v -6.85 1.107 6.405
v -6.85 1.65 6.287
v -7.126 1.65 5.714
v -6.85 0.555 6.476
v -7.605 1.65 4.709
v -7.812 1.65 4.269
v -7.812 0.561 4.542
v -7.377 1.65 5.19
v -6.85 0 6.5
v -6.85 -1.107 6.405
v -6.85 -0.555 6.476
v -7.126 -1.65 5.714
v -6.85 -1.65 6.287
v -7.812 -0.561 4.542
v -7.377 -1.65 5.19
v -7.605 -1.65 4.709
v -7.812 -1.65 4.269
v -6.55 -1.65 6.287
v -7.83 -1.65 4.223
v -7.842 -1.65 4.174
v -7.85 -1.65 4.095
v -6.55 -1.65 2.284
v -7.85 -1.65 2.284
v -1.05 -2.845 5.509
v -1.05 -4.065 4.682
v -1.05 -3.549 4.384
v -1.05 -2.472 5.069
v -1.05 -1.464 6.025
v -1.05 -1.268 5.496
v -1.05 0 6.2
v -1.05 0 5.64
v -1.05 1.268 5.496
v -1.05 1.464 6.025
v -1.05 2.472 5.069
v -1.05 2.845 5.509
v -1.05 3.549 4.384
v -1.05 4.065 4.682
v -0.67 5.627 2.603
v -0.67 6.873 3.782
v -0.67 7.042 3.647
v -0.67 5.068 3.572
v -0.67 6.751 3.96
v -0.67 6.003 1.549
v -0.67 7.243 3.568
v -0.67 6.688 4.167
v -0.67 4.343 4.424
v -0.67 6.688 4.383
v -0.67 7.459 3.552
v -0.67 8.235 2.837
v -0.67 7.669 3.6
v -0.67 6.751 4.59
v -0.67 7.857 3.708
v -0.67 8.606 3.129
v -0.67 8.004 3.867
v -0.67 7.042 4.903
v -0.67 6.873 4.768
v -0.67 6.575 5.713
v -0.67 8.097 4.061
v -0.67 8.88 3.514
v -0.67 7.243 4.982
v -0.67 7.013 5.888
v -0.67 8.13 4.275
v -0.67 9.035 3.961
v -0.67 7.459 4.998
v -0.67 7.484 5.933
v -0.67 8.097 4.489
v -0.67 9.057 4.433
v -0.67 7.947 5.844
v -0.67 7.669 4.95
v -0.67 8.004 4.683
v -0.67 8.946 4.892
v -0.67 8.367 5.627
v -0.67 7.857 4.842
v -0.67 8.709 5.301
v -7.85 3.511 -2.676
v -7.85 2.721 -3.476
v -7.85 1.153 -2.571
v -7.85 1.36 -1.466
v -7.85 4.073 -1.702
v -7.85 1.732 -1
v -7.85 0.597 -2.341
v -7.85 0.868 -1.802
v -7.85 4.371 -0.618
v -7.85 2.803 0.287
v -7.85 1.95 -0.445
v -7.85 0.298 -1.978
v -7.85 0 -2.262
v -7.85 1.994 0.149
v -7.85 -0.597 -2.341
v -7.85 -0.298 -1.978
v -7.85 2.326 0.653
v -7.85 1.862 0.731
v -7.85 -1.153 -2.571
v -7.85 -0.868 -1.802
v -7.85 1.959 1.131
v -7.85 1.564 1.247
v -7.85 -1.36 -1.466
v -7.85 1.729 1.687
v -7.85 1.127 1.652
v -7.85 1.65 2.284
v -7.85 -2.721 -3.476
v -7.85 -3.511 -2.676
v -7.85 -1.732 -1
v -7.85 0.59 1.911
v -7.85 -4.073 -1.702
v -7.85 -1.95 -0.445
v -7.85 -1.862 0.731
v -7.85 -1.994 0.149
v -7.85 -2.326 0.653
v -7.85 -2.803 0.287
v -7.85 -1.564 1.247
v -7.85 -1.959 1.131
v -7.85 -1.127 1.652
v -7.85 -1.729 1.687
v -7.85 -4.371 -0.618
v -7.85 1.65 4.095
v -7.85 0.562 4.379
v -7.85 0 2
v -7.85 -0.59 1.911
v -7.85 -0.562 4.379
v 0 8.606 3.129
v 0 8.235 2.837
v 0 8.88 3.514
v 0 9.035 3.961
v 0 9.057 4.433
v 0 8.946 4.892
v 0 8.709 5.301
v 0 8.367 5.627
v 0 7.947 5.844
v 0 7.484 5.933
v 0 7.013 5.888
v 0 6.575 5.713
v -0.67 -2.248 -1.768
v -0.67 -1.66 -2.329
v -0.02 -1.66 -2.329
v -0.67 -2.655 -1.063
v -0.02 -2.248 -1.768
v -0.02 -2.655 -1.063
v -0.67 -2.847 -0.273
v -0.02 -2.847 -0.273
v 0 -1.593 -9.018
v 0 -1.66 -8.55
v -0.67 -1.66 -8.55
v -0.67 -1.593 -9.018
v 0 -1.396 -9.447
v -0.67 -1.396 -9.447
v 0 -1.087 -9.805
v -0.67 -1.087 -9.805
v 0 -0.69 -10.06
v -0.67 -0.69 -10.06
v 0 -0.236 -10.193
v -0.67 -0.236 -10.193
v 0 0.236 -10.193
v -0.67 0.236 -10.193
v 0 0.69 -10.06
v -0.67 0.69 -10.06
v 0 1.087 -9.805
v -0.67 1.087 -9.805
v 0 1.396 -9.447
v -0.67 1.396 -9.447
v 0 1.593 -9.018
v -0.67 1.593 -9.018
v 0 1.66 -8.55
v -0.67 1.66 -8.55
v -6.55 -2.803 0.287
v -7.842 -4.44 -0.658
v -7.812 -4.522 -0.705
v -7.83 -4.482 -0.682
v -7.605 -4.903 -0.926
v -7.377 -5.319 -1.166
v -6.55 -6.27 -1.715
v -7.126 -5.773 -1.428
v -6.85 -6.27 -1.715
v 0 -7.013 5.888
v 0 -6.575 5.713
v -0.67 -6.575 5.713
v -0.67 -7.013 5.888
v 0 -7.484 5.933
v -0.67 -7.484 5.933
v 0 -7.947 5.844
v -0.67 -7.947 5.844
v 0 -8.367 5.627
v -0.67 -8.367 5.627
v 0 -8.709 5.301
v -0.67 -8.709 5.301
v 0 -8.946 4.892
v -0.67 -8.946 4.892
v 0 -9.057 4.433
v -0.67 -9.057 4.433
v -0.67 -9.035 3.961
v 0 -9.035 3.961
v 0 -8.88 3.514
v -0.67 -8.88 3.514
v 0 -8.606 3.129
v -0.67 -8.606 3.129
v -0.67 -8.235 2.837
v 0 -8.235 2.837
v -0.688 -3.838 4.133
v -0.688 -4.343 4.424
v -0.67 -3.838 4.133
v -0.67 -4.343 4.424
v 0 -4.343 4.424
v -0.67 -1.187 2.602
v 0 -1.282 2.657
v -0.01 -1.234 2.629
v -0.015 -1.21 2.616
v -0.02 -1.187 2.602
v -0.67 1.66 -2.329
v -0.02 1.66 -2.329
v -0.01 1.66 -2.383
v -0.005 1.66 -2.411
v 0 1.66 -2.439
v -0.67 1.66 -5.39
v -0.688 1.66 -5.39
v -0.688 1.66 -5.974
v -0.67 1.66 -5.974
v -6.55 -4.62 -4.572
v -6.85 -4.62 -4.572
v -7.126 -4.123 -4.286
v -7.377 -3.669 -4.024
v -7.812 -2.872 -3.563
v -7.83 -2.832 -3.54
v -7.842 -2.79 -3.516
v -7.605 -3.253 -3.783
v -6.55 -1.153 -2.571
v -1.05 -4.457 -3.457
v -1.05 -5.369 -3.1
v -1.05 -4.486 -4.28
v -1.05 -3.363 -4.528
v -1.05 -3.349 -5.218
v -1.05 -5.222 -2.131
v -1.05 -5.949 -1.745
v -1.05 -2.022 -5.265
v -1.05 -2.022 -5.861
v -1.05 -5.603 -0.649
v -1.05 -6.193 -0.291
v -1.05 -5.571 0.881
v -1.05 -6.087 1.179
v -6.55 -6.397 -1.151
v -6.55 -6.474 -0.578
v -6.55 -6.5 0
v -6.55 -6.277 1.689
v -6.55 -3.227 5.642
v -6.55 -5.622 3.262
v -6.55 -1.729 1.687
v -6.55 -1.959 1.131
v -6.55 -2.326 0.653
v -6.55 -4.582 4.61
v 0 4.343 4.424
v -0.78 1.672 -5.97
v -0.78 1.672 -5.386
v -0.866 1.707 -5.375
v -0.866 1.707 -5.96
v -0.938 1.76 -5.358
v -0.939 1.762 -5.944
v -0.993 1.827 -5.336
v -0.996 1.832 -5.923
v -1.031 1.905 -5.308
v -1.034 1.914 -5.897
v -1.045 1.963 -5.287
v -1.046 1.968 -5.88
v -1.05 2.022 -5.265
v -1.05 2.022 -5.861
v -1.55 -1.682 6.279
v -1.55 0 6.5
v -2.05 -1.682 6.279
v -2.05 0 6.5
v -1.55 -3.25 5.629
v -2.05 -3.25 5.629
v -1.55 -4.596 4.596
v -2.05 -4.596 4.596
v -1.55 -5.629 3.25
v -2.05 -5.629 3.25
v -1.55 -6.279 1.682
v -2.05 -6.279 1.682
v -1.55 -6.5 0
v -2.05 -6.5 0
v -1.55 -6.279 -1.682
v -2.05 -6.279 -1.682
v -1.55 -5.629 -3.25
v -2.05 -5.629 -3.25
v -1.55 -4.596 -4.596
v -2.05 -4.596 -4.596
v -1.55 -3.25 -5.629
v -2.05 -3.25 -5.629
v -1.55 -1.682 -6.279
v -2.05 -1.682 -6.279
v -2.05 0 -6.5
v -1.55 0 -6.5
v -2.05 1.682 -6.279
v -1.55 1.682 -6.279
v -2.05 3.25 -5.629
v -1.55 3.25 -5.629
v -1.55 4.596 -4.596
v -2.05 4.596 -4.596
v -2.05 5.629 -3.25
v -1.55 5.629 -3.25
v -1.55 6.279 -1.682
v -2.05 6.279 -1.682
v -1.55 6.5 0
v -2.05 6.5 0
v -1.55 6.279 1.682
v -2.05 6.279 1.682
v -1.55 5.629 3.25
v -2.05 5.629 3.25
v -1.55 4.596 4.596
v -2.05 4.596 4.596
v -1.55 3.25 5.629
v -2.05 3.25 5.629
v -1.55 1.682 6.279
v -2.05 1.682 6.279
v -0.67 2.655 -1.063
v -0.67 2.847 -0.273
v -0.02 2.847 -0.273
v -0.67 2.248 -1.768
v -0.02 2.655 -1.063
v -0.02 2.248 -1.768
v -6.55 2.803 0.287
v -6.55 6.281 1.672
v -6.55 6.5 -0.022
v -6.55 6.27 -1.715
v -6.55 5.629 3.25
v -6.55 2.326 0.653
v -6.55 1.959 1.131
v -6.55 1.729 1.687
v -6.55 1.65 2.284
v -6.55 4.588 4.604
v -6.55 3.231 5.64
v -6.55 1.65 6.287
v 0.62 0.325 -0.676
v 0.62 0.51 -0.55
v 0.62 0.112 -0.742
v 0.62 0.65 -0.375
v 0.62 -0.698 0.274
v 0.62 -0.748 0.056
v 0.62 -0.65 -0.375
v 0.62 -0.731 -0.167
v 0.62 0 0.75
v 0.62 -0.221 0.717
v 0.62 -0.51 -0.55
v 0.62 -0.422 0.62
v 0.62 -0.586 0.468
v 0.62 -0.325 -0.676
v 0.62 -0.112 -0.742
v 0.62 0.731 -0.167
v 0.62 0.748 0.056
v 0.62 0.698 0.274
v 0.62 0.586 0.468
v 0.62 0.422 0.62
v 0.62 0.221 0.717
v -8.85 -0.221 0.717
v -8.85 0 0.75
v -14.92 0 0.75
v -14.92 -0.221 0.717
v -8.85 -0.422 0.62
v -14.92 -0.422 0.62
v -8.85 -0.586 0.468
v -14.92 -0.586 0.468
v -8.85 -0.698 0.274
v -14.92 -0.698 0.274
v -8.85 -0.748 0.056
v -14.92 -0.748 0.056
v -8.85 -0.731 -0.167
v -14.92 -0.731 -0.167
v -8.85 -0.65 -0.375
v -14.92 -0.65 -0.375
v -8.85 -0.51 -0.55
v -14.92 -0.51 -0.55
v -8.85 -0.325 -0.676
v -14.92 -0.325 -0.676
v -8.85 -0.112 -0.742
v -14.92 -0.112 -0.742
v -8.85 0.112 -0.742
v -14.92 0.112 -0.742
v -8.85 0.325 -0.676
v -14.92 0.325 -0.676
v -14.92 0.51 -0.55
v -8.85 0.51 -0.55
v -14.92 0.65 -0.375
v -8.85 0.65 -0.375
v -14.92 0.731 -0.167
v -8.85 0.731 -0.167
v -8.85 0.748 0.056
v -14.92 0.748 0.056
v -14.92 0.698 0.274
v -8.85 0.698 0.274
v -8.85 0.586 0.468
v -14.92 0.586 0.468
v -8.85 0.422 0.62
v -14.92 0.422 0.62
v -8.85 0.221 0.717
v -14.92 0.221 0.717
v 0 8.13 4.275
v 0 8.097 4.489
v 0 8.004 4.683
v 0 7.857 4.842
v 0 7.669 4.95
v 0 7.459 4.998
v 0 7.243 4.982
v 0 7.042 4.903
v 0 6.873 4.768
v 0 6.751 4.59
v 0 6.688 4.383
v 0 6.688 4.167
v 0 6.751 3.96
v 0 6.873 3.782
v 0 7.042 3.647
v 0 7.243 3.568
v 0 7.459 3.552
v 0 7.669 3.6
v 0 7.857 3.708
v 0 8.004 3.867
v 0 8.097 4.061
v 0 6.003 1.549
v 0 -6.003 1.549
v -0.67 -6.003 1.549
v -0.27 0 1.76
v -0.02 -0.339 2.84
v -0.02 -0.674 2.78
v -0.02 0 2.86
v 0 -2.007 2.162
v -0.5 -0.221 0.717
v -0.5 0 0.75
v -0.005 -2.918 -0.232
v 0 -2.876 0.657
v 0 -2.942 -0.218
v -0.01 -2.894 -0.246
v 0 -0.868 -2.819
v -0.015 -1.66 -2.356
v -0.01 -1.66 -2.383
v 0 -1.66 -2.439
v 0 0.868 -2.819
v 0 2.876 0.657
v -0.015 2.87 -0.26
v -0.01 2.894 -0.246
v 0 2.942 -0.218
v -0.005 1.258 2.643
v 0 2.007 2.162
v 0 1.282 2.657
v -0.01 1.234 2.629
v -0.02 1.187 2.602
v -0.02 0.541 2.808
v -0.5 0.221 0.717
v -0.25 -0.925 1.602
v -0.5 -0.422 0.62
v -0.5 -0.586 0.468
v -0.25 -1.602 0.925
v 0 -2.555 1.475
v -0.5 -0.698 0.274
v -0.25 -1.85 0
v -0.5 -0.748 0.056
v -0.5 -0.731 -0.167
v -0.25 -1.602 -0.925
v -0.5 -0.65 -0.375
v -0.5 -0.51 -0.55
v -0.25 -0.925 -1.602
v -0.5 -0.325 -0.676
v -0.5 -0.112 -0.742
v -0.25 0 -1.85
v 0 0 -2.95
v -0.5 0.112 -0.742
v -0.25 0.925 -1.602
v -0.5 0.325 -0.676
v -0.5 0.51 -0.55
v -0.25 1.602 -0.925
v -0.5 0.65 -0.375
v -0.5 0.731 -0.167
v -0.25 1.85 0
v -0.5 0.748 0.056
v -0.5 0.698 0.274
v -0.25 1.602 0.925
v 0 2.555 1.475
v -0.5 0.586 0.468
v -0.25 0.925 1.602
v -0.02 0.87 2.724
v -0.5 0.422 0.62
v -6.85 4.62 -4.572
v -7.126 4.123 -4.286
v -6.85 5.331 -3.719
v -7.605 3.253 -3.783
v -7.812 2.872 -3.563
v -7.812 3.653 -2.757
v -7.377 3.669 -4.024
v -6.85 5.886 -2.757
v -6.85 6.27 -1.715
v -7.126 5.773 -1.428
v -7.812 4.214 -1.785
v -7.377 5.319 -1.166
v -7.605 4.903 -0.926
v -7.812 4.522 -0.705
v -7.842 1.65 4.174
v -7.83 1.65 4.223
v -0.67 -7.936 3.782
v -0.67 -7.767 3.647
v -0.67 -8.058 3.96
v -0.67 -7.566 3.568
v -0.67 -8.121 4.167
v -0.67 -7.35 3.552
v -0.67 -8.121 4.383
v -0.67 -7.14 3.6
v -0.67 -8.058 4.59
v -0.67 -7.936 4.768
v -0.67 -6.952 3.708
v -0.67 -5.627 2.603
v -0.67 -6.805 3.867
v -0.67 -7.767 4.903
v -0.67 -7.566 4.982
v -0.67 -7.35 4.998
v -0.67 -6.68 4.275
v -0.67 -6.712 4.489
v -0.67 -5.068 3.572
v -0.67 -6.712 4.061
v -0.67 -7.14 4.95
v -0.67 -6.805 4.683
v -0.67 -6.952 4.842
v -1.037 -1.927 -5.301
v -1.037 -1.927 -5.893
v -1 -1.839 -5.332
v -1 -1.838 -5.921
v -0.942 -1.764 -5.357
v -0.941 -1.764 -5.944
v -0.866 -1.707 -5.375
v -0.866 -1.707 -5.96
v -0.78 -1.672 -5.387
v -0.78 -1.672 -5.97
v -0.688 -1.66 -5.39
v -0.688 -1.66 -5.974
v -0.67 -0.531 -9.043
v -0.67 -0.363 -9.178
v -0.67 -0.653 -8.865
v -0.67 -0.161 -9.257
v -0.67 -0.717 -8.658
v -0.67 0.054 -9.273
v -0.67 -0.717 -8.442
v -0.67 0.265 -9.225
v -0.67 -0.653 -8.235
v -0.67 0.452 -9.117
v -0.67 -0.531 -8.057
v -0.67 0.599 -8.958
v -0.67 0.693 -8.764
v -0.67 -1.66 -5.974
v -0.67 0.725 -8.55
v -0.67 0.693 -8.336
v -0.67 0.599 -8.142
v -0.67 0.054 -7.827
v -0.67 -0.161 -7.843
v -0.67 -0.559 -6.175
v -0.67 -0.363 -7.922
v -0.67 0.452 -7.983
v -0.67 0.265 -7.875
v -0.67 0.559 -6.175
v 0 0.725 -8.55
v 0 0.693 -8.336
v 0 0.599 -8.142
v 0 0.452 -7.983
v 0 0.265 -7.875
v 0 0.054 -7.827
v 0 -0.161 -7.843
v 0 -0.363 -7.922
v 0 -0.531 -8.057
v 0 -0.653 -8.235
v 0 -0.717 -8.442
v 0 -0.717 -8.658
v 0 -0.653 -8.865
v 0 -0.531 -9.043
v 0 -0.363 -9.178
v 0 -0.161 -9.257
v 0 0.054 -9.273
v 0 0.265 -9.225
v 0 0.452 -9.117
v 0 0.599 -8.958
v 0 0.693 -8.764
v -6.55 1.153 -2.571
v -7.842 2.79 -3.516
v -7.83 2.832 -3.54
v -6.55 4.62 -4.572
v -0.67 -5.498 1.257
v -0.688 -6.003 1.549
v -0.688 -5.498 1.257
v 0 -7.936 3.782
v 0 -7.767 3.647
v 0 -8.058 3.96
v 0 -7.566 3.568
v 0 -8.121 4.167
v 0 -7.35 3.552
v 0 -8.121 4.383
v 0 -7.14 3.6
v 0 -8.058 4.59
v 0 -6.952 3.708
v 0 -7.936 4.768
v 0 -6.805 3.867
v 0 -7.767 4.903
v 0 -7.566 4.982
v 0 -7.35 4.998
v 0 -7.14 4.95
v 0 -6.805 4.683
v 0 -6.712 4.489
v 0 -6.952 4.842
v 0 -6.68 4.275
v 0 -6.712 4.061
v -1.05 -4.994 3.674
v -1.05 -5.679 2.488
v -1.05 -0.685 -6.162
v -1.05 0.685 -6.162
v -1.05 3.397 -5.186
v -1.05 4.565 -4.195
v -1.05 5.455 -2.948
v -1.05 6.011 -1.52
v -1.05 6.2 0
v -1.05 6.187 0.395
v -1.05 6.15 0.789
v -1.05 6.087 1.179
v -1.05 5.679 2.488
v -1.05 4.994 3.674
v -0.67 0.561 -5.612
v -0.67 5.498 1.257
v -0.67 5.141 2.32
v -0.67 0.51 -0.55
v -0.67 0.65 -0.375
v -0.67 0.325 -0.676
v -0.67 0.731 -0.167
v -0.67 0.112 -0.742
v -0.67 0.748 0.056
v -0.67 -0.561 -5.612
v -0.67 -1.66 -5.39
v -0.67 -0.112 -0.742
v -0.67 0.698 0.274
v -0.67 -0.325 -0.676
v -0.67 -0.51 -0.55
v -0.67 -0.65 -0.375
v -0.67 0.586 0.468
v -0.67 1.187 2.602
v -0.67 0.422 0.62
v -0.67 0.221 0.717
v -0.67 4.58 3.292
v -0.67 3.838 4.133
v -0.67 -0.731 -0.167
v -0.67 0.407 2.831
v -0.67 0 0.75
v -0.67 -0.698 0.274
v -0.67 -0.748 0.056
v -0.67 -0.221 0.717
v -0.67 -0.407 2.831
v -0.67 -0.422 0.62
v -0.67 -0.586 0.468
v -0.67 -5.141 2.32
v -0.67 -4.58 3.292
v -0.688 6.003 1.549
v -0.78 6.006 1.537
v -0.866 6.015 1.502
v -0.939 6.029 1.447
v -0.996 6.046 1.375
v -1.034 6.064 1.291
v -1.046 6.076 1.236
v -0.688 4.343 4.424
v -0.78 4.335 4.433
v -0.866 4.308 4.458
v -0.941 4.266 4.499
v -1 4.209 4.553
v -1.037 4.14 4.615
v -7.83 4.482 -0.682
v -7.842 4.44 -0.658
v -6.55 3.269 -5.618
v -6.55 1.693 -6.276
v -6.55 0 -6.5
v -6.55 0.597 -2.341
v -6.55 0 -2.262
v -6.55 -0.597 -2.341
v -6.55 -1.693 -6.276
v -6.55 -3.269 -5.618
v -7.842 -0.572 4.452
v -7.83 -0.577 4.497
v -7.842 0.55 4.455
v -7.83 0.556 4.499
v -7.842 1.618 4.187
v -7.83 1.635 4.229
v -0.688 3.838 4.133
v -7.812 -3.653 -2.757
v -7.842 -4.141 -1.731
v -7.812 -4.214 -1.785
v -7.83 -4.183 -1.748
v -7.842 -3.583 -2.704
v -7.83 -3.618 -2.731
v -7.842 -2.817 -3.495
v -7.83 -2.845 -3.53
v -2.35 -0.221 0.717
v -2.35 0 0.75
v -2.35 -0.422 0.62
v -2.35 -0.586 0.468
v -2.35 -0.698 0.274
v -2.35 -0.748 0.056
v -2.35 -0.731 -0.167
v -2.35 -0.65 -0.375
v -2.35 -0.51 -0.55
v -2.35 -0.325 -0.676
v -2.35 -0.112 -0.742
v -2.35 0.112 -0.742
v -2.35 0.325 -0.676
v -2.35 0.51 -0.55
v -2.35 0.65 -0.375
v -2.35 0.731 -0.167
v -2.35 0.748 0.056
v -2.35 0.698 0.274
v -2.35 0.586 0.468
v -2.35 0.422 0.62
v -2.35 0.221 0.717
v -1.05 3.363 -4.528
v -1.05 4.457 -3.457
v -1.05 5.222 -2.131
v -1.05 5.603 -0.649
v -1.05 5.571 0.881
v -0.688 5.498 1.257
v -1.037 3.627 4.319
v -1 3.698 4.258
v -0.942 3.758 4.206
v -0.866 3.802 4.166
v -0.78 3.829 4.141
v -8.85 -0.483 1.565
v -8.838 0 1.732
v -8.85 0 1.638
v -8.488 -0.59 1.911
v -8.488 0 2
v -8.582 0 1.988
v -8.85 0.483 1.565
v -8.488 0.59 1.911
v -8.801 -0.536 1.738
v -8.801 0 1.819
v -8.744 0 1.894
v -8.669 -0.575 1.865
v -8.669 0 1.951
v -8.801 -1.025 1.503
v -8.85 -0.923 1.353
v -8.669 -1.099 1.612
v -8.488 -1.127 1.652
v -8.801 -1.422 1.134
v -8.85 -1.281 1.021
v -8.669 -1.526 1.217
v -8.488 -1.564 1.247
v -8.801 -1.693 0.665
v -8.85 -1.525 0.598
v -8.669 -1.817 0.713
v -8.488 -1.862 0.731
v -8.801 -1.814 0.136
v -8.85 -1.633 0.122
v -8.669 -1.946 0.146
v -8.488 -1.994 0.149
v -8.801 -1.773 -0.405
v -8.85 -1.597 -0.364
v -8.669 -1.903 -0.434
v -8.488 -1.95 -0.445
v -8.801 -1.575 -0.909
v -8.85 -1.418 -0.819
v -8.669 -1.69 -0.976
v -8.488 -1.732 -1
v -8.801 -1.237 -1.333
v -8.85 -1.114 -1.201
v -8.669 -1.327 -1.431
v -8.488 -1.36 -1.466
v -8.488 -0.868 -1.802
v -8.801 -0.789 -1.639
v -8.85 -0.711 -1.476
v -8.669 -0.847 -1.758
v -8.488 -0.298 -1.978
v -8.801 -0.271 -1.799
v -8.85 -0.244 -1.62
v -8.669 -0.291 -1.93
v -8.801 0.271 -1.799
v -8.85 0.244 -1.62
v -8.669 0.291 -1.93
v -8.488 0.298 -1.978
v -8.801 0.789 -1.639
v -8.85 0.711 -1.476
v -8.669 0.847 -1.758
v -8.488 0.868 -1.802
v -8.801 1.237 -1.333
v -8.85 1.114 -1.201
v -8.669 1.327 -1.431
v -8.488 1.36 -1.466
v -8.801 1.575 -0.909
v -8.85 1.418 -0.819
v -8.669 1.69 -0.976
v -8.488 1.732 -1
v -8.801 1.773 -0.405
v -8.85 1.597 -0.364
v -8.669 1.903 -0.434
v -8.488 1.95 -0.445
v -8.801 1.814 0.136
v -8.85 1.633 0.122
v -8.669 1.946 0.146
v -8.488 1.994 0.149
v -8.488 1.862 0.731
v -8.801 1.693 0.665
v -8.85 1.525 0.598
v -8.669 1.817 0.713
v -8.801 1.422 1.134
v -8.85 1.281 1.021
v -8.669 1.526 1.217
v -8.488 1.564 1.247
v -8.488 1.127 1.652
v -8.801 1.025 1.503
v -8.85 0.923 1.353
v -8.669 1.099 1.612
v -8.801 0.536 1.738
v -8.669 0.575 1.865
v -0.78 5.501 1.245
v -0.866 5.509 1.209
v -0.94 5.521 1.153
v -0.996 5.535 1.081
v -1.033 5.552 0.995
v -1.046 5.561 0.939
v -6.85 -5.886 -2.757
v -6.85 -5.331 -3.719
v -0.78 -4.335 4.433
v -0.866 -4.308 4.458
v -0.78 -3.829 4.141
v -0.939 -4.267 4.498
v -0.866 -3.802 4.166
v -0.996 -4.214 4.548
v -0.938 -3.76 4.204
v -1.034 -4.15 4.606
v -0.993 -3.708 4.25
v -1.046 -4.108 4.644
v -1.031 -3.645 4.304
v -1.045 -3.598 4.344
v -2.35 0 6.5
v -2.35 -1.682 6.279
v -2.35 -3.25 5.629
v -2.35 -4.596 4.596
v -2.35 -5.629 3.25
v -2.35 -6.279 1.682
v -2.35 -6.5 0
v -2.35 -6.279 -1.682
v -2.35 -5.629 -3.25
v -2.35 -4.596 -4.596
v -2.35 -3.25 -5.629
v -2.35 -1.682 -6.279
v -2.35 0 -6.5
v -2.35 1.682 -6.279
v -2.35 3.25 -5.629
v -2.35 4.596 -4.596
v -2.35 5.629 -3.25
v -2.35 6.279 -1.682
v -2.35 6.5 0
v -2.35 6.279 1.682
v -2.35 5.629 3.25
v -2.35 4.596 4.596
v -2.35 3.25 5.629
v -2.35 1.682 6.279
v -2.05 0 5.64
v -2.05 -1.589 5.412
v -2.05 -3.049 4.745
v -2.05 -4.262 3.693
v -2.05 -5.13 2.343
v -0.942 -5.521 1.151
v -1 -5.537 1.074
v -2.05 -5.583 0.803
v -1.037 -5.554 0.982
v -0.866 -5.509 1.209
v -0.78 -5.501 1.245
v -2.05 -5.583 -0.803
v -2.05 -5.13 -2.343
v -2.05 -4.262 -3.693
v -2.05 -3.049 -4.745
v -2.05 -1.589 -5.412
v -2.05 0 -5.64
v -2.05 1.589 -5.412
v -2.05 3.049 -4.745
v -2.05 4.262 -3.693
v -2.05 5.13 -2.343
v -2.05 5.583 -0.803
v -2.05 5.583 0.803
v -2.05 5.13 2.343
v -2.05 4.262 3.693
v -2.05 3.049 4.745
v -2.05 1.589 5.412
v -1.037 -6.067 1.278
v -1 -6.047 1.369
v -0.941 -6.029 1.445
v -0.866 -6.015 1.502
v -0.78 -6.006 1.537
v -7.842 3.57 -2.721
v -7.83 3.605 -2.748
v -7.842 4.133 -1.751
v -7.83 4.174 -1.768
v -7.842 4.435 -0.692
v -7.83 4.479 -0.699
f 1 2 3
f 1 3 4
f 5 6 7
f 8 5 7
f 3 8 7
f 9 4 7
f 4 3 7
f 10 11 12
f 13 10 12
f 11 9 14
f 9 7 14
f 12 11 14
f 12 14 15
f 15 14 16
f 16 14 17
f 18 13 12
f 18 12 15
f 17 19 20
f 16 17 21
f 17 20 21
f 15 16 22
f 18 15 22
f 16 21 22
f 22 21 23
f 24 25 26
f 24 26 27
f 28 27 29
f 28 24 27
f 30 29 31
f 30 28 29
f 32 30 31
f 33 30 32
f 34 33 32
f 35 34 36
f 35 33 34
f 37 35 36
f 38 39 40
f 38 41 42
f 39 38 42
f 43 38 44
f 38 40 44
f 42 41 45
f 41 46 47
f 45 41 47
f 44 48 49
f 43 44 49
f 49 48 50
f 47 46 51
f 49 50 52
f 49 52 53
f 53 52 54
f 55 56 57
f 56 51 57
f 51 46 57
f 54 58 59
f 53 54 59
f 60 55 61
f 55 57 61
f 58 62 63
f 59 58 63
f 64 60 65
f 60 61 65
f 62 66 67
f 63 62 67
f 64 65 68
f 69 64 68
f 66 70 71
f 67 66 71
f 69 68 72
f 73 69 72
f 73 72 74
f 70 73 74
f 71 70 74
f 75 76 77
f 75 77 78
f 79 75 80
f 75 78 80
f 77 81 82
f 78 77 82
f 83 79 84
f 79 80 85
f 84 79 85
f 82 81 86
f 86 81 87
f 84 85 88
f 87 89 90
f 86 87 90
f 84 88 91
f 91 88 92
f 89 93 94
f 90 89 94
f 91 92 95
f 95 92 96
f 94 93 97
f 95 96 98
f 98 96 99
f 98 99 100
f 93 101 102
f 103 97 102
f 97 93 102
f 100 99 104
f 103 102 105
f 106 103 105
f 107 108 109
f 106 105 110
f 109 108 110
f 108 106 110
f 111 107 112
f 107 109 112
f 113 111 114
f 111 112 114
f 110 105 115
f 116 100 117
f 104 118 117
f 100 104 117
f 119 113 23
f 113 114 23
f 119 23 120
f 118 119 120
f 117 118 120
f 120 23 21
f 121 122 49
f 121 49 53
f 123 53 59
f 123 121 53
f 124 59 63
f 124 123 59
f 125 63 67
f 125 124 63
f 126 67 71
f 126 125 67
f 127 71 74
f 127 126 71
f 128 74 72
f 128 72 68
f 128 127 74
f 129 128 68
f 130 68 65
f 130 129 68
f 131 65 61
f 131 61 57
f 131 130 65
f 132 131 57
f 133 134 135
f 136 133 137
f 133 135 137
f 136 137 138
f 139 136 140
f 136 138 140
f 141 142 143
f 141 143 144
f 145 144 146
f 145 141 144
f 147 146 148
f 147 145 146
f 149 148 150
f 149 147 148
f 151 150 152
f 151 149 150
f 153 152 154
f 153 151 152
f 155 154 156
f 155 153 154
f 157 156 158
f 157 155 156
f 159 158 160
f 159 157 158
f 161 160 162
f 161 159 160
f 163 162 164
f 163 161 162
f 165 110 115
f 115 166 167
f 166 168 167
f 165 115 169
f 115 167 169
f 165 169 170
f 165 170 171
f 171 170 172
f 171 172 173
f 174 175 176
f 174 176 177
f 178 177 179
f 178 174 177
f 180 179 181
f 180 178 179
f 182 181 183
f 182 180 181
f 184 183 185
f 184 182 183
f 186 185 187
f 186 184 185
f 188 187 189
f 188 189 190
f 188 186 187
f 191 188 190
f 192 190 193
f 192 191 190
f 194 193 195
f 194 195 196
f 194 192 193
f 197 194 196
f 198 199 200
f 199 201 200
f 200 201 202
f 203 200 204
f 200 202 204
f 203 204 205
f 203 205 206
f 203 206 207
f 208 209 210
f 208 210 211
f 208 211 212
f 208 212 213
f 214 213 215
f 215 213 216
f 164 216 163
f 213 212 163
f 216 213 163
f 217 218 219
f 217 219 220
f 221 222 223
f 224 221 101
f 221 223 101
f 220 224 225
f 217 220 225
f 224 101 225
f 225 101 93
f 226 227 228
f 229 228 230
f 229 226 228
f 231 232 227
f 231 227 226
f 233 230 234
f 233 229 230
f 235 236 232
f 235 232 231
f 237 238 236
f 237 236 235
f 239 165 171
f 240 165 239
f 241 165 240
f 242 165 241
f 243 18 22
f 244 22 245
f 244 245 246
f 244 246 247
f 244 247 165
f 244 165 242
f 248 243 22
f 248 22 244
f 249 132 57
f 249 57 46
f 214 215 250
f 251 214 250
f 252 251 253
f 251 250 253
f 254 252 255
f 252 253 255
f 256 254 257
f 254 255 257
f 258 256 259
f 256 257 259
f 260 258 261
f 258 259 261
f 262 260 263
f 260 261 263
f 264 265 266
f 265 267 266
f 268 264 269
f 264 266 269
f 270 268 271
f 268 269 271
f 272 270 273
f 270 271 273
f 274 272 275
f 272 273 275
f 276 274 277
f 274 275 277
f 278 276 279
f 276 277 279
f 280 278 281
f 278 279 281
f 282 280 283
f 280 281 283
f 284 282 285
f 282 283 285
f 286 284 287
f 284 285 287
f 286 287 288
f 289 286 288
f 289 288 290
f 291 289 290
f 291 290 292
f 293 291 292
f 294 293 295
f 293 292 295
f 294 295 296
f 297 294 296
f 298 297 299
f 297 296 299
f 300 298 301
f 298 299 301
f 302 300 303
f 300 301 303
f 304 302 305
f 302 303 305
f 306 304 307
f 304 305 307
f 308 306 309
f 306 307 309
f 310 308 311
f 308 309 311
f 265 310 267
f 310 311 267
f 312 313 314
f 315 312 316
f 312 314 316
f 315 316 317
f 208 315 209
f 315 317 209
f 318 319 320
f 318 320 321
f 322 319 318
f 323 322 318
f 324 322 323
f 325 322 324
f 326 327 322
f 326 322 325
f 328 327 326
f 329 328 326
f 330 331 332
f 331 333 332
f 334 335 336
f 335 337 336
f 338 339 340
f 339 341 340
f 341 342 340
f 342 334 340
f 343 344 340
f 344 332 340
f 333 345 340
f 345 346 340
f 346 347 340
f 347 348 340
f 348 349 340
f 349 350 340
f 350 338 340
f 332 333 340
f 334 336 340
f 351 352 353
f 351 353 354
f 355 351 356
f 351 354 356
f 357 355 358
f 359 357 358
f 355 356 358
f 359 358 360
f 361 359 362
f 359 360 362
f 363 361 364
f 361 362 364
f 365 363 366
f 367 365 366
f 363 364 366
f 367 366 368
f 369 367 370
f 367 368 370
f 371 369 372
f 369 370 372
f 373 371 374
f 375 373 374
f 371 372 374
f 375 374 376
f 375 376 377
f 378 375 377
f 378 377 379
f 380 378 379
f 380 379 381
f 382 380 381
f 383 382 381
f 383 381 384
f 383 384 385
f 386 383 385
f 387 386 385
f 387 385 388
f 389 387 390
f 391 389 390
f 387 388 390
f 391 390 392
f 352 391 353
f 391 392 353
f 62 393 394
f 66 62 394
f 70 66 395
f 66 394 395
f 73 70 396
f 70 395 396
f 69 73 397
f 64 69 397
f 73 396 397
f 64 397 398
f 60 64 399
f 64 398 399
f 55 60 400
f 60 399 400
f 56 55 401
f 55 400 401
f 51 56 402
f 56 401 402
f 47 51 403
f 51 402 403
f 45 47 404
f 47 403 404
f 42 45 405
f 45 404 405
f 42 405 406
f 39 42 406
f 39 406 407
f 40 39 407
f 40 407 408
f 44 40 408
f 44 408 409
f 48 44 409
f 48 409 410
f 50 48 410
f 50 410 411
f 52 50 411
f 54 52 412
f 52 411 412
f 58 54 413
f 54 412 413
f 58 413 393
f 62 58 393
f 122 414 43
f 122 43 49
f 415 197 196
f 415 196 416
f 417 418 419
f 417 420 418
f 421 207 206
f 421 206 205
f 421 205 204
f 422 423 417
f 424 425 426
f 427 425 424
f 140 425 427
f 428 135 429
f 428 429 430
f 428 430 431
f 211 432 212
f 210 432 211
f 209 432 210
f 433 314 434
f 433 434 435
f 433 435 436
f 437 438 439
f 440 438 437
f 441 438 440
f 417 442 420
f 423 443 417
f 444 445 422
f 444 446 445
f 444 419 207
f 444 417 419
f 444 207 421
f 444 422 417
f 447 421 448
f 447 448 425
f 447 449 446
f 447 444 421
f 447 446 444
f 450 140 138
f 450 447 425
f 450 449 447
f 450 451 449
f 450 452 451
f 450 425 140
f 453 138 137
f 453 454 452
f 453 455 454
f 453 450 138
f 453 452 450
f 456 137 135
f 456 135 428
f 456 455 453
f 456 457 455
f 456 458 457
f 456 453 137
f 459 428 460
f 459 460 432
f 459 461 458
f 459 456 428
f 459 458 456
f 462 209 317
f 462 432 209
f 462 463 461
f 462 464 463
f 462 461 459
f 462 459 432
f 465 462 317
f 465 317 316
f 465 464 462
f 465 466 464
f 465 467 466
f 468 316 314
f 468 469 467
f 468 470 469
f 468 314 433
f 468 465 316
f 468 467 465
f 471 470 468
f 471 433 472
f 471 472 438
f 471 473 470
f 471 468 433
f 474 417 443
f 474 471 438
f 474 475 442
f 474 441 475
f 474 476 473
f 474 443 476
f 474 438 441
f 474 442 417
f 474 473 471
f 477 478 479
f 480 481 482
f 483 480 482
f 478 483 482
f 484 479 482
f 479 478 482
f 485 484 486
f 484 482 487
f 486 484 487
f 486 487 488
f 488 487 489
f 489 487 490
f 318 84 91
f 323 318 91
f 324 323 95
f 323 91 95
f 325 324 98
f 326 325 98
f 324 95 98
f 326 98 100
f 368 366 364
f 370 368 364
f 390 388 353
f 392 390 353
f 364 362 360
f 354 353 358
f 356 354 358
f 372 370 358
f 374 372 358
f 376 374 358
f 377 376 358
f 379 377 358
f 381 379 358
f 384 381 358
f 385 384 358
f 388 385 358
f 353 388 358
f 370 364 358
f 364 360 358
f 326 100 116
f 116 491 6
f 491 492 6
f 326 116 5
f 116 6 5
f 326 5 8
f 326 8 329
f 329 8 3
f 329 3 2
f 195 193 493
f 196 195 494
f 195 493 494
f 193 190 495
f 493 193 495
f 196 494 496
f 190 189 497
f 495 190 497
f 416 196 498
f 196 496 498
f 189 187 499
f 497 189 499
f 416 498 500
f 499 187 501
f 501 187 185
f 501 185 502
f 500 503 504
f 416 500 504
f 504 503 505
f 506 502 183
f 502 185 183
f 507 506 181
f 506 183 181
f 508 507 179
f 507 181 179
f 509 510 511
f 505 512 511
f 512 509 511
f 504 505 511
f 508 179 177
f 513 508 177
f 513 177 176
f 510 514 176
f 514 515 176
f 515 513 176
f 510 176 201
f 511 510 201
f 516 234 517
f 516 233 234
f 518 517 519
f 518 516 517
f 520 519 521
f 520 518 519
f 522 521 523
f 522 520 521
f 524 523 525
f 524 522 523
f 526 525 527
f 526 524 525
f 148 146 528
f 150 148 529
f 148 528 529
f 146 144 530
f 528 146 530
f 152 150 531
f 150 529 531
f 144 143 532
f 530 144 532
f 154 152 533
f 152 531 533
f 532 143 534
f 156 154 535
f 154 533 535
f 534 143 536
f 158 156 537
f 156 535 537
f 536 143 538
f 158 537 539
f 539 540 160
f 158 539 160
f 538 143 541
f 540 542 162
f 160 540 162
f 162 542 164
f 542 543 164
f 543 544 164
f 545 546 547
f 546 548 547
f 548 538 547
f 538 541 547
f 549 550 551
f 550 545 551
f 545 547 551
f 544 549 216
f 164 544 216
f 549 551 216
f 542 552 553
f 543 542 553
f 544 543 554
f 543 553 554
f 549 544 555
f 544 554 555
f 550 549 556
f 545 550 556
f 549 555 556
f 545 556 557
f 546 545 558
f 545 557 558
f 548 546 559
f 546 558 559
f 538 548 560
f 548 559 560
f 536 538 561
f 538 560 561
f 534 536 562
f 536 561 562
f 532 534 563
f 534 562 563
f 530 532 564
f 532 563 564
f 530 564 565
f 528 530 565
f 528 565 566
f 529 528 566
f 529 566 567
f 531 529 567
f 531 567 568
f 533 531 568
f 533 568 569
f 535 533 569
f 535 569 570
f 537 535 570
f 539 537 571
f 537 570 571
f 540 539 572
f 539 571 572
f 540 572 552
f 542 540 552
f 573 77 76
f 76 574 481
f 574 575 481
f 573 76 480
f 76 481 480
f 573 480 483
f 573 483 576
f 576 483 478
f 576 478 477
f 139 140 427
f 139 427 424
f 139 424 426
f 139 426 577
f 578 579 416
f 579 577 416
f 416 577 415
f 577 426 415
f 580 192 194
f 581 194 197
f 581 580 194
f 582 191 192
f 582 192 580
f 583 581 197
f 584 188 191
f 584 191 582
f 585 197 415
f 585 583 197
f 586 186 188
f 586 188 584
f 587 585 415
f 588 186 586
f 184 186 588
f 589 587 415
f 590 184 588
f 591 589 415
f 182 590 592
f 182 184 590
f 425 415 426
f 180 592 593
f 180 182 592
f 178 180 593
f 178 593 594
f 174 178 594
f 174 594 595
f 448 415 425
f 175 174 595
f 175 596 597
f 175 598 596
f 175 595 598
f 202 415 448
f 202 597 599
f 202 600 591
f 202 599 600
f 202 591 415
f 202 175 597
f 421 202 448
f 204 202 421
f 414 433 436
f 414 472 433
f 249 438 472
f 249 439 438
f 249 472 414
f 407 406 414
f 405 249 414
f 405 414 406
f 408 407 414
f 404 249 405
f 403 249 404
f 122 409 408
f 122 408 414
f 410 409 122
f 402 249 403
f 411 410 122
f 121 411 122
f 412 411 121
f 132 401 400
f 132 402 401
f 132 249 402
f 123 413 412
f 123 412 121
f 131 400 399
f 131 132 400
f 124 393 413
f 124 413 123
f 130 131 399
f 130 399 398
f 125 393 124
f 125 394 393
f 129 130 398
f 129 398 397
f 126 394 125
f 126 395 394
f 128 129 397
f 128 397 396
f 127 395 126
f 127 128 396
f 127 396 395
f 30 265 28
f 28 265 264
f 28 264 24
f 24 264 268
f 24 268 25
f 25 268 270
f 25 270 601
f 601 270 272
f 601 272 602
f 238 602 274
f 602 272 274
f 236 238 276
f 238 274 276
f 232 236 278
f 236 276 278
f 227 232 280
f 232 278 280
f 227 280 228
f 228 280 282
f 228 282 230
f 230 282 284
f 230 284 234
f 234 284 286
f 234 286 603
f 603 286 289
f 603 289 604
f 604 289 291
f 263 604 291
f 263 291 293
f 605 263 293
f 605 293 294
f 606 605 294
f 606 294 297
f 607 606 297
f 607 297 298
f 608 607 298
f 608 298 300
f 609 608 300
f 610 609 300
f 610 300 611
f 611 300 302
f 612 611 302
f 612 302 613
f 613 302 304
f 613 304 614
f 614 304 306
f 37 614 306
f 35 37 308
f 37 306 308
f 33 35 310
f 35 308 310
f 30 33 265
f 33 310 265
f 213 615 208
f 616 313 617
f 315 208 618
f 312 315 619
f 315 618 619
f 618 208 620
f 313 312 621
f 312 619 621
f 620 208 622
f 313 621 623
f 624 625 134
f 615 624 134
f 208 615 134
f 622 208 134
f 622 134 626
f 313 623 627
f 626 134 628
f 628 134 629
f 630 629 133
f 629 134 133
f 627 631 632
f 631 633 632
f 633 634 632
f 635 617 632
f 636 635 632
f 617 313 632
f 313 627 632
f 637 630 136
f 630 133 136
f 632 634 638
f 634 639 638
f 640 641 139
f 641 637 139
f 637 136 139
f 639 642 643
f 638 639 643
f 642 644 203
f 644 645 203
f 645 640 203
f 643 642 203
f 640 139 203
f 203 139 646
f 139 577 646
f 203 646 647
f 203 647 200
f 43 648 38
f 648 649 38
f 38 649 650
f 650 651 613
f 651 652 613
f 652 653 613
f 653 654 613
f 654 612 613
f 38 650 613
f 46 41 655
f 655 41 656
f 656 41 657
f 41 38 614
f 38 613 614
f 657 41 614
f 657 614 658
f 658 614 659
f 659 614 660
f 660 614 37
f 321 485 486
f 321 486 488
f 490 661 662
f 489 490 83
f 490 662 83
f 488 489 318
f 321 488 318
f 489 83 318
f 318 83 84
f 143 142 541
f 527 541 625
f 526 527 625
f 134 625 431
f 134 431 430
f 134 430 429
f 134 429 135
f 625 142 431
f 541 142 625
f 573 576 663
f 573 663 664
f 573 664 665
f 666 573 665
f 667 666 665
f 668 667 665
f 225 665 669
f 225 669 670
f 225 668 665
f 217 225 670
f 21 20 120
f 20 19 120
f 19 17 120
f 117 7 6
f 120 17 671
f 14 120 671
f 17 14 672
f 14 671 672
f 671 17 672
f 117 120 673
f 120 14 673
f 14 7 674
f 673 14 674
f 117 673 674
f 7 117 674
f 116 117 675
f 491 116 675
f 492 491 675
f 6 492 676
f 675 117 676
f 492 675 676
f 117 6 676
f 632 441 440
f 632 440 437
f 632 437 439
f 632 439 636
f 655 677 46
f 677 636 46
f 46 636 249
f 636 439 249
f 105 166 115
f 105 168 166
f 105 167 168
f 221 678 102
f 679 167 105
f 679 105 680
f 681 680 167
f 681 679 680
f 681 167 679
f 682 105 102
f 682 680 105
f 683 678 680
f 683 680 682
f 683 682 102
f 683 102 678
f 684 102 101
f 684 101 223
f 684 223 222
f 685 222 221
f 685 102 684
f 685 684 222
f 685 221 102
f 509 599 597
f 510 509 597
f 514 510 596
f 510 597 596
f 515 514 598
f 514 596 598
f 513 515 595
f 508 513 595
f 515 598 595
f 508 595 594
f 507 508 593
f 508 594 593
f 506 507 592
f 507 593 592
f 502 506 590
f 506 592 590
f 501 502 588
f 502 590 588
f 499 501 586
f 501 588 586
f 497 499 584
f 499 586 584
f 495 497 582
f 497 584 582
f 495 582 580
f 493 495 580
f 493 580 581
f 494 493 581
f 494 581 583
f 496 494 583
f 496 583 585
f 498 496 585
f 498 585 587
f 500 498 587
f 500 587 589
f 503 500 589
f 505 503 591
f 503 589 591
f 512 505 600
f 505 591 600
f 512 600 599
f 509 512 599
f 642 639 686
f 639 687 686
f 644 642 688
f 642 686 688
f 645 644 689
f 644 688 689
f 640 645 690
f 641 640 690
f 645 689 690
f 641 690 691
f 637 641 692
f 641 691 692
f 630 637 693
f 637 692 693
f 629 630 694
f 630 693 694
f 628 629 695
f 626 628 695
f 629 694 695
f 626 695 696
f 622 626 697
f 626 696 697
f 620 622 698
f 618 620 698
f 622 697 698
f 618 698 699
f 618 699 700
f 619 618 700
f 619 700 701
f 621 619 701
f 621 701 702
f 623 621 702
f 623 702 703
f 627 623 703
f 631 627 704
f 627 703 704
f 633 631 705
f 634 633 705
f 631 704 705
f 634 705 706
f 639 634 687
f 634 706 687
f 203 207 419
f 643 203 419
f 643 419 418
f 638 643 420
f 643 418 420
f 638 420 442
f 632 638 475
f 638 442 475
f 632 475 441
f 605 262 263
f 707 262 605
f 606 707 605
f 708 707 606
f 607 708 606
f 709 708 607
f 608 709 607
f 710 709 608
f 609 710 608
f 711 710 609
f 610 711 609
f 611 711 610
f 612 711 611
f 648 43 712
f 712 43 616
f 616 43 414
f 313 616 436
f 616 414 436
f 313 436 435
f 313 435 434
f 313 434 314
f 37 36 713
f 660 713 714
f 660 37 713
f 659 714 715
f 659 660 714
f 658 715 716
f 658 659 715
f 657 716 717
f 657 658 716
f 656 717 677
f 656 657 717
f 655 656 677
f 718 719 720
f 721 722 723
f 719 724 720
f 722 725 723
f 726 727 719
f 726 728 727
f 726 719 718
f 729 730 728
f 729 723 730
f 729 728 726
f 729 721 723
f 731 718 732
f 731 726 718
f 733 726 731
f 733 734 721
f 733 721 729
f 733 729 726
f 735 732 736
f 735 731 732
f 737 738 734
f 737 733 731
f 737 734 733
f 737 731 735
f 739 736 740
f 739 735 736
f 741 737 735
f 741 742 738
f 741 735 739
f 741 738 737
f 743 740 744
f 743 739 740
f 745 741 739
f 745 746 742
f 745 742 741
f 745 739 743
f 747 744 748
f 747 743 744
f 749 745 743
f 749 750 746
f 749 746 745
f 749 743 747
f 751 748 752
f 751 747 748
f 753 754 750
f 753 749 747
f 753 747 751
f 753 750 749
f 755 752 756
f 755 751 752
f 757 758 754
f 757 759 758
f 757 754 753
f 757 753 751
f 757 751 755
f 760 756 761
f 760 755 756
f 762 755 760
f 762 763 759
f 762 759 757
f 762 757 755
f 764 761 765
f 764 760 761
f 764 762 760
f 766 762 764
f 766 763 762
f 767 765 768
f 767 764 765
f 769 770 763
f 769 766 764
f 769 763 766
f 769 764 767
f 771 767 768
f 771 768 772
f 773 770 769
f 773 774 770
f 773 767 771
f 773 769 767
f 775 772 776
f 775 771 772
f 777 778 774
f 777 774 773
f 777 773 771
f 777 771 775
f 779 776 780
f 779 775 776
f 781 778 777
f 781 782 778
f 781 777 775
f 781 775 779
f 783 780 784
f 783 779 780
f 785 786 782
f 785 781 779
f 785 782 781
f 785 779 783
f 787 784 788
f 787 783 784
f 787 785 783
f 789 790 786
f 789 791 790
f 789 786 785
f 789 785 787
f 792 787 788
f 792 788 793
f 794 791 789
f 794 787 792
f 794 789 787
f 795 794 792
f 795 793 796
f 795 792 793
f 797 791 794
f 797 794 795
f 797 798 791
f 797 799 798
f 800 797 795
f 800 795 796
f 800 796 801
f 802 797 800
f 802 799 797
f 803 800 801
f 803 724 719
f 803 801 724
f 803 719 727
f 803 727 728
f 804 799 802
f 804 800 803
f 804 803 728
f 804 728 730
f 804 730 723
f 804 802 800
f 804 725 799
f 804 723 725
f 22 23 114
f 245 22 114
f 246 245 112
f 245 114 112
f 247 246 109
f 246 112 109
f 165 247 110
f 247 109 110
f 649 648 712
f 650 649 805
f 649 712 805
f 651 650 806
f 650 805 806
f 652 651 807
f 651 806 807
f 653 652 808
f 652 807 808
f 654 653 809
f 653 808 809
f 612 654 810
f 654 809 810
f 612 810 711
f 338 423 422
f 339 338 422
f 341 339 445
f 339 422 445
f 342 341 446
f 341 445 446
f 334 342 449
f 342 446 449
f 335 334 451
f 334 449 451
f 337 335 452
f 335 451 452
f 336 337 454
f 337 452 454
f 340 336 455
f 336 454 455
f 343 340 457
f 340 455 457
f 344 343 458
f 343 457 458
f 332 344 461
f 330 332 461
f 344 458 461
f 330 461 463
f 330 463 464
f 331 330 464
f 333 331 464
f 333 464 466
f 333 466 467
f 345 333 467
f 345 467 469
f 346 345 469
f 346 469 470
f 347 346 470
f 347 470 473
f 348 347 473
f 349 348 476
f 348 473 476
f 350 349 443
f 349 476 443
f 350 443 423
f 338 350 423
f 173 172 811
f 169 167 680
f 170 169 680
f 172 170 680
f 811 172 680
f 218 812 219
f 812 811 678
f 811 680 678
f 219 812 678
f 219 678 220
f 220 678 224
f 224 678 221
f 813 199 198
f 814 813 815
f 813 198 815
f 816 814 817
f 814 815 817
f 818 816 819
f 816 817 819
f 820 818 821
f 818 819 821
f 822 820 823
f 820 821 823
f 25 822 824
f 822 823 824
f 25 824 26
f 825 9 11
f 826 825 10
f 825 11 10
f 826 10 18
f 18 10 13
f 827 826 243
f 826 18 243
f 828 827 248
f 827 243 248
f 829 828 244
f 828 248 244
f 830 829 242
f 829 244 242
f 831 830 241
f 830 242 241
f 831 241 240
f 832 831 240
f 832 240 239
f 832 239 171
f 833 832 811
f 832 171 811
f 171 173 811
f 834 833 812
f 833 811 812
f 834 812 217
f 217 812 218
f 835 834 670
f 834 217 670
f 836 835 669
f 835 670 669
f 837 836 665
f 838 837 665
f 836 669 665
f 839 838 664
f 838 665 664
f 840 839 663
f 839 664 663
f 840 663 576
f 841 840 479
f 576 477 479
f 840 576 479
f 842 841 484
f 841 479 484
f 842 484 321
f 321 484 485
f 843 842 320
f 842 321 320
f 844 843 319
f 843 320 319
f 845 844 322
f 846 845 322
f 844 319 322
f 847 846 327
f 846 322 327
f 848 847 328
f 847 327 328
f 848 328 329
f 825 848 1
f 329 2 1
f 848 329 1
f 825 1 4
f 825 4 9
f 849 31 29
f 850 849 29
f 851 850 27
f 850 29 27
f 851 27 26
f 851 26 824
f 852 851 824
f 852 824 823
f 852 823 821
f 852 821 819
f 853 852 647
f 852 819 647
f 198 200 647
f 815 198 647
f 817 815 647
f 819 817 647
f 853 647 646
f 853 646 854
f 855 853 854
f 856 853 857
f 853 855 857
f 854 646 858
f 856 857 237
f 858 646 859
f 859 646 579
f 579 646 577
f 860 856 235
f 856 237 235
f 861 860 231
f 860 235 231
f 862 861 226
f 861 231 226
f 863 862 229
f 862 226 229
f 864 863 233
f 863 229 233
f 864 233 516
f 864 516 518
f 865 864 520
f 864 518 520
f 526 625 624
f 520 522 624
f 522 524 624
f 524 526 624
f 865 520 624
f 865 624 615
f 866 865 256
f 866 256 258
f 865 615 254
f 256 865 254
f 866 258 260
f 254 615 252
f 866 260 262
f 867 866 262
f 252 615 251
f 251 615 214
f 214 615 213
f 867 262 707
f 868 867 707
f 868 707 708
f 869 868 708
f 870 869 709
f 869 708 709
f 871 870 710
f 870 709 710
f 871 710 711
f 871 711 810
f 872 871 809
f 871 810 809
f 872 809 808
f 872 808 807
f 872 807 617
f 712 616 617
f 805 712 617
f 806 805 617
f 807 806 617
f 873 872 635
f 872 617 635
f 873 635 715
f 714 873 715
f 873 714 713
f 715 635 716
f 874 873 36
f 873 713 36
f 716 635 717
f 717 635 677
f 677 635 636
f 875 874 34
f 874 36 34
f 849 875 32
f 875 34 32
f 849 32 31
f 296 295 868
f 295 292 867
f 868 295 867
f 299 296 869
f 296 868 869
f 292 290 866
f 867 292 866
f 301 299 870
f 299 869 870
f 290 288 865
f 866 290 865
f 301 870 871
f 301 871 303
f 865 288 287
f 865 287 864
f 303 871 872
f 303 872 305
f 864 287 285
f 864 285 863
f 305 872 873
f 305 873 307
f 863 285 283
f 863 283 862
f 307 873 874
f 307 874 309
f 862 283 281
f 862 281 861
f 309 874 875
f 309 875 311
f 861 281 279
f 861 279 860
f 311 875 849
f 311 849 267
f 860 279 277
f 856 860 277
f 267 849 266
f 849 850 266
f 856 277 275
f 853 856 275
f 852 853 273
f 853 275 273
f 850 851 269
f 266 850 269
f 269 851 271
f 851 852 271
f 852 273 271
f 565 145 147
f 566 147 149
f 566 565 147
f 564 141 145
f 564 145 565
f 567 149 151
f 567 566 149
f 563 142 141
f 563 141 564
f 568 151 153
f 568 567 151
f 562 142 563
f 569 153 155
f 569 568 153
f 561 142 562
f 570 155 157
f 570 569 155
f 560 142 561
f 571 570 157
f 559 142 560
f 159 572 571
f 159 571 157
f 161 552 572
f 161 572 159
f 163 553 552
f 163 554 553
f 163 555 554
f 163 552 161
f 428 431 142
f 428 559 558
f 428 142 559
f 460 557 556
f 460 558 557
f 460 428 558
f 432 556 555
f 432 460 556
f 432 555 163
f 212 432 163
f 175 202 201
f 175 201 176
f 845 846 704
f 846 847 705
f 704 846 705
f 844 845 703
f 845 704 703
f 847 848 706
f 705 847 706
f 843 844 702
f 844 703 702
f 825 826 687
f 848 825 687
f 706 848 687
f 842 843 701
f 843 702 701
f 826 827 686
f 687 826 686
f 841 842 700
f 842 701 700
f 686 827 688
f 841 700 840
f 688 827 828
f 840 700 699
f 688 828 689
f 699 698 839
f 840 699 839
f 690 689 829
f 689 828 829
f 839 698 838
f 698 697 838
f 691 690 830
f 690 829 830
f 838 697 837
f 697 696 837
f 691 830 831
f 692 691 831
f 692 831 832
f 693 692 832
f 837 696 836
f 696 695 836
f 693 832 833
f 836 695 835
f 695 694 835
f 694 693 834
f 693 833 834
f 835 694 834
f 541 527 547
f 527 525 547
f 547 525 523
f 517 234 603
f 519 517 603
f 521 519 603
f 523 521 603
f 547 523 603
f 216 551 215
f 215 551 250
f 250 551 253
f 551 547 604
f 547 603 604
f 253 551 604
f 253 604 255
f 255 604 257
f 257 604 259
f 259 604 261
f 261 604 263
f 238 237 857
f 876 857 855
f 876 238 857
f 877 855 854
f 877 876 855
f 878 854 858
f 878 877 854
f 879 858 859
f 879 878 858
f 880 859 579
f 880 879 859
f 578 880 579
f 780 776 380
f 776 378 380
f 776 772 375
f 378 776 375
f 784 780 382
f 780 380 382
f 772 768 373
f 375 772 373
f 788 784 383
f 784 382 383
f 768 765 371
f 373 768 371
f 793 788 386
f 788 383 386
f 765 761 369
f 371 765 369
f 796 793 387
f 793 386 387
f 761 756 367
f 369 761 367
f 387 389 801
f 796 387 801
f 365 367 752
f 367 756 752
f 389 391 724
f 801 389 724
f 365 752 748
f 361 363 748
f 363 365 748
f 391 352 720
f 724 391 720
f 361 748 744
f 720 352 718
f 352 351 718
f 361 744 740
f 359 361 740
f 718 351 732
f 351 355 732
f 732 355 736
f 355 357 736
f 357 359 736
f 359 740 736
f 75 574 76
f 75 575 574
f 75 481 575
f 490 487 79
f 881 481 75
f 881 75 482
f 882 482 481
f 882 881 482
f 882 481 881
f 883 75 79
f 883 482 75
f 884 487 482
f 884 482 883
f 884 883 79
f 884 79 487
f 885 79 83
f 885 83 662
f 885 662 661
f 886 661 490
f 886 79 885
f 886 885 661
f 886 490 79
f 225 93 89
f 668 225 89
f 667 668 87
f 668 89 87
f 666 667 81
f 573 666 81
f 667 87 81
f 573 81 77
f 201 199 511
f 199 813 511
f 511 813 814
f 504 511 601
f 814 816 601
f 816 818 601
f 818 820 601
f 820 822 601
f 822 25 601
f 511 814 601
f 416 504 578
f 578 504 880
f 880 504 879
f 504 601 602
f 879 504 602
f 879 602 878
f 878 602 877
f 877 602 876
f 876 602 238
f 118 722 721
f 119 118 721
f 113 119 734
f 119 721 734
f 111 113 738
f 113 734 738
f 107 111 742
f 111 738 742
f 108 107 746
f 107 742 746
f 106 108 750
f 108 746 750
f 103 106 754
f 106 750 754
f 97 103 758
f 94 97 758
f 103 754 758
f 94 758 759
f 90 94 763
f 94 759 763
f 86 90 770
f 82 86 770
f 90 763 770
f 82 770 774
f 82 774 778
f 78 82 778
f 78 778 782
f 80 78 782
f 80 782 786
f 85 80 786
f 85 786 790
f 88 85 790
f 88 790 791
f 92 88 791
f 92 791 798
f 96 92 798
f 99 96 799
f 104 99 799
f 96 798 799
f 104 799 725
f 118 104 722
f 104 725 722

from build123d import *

# Parameters (mm, degrees)
F4_DEPTH = 1.3
F6_DEPTH = 1.05
F5_R     = 0.725
F7_DEPTH = 0.67
F8_R     = 0.3621320344
F8_2_R   = 0.3621320344


# Not quite as in the source:
# - a fillet or chamfer that OpenCascade refuses, or shapes differently, is made with other operations: its cross-section is extruded or revolved along the edge and cut away or added


with BuildPart() as f1:
    # F0 (on Front) → F1 (revolve)
    with BuildSketch(Plane.XZ):
        Polygon((-8.85, 2), (-8.85, 0.75), (-2.35, 0.75), (-2.35, 6.5), (-7.85, 6.5), (-7.85, 2), align=None)
    revolve(axis=Axis((6.5496404592, 0, 0), (1, 0, 0)))

    # F3: chamfer of 2 x 1 on 1 edges, made by hand

    # F3_s1 → F3_t2 (revolve, cut)
    with BuildSketch(Plane.XZ):
        Polygon((-6.85, 6.5), (-7.85, 4.5), (-7.85, 6.5), align=None)
    revolve(axis=Axis((-7.85, 0, 0), (1, 0, 0)), mode=Mode.SUBTRACT)

    # F2 (on face) → F4 (cut)
    with BuildSketch(Plane(origin=(-7.85, 0, 0), x_dir=(0, -1, 0), z_dir=(-1, 0, 0))):
        with BuildLine():
            Line((-1.65, 2.2843407316), (-1.65, 6.2870899469))
            ThreePointArc((-1.65, 6.2870899469), (-5.6291651246, 3.25), (-6.2697796099, -1.7146030572))
            Line((-6.2697796099, -1.7146030572), (-2.8032971045, 0.2867715504))
            ThreePointArc((-2.8032971045, 0.2867715504), (-1.9590250278, 1.1310436271), (-1.65, 2.2843407316))
        make_face()
        with BuildLine():
            ThreePointArc((6.5, 0), (5.14660082, 3.9702015062), (1.65, 6.2870899469))
            Line((1.65, 6.2870899469), (1.65, 2.2843407316))
            ThreePointArc((1.65, 2.2843407316), (1.9590250278, 1.1310436271), (2.8032971045, 0.2867715504))
            Line((2.8032971045, 0.2867715504), (6.2697796099, -1.7146030572))
            ThreePointArc((6.2697796099, -1.7146030572), (6.4421878063, -0.8649949526), (6.5, 0))
        make_face()
        with BuildLine():
            Line((-1.1532971045, -2.571112282), (-4.6197796099, -4.5724868897))
            ThreePointArc((-4.6197796099, -4.5724868897), (0, -6.5), (4.6197796099, -4.5724868897))
            Line((4.6197796099, -4.5724868897), (1.1532971045, -2.571112282))
            ThreePointArc((1.1532971045, -2.571112282), (0, -2.2620872543), (-1.1532971045, -2.571112282))
        make_face()
    extrude(amount=-F4_DEPTH, mode=Mode.SUBTRACT)

    # F8
    f8_edges = [f1.edges().sort_by_distance(p)[0] for p in [
        (-7.85, 0, 4.5),
        (-7.85, 3.897114, -2.25),
        (-7.85, -3.897114, -2.25),
        (-8.85, 0, -2),
    ]]
    fillet(f8_edges, radius=F8_R)



with BuildPart() as f1b:
    # F0 (on Front) → F1, piece 2 (revolve)
    with BuildSketch(Plane.XZ):
        Polygon((-0.67, 0.75), (0, 0.75), (0, 6.2), (-1.05, 6.2), (-1.55, 6.5), (-2.05, 6.5), (-2.05, 5.64), (-0.67, 5.64), align=None)
    revolve(axis=Axis((6.5496404592, 0, 0), (1, 0, 0)))

    # F5 (on face) → F6 (cut)
    with BuildSketch(Plane.YZ):
        with BuildLine():
            ThreePointArc((4.3433258161, 4.4244232228), (0, 6.2), (-4.3433258161, 4.4244232228))
            Line((-4.3433258161, 4.4244232228), (-1.1869283577, 2.6020763005))
            ThreePointArc((-1.1869283577, 2.6020763005), (0, 2.86), (1.1869283577, 2.6020763005))
            Line((1.1869283577, 2.6020763005), (4.3433258161, 4.4244232228))
        make_face()
        with BuildLine():
            Line((1.66, -2.3289482605), (1.66, -5.9736421051))
            ThreePointArc((1.66, -5.9736421051), (4.936192865, -3.75153302), (6.2, 0))
            ThreePointArc((6.2, 0), (6.150634929, 0.780826466), (6.0033258161, 1.5492188823))
            Line((6.0033258161, 1.5492188823), (2.8469283577, -0.27312804))
            ThreePointArc((2.8469283577, -0.27312804), (2.4768326548, -1.43), (1.66, -2.3289482605))
        make_face()
        with BuildLine():
            ThreePointArc((-6.0033258161, 1.5492188823), (-5.3693575035, -3.1), (-1.66, -5.9736421051))
            Line((-1.66, -5.9736421051), (-1.66, -2.3289482605))
            ThreePointArc((-1.66, -2.3289482605), (-2.4768326548, -1.43), (-2.8469283577, -0.27312804))
            Line((-2.8469283577, -0.27312804), (-6.0033258161, 1.5492188823))
        make_face()
    extrude(amount=-F6_DEPTH, mode=Mode.SUBTRACT)

    # F5 (on face) → F7 (join)
    with BuildSketch(Plane.YZ):
        with BuildLine():
            Line((-8.2345172024, 2.8373978297), (-6.0033258161, 1.5492188823))
            ThreePointArc((-6.0033258161, 1.5492188823), (-5.3693575035, 3.1), (-4.3433258161, 4.4244232228))
            Line((-4.3433258161, 4.4244232228), (-6.5745172024, 5.7126021703))
            ThreePointArc((-6.5745172024, 5.7126021703), (-8.8421193726, 5.105), (-8.2345172024, 2.8373978297))
        make_face()
        with Locations((-7.4045172024, 4.275)):
            Circle(F5_R, mode=Mode.SUBTRACT)
        with BuildLine():
            ThreePointArc((4.3433258161, 4.4244232228), (5.3693575035, 3.1), (6.0033258161, 1.5492188823))
            Line((6.0033258161, 1.5492188823), (8.2345172024, 2.8373978297))
            ThreePointArc((8.2345172024, 2.8373978297), (8.8421193726, 5.105), (6.5745172024, 5.7126021703))
            Line((6.5745172024, 5.7126021703), (4.3433258161, 4.4244232228))
        make_face()
        with Locations((7.4045172024, 4.275)):
            Circle(F5_R, mode=Mode.SUBTRACT)
        with BuildLine():
            Line((1.66, -8.55), (1.66, -5.9736421051))
            ThreePointArc((1.66, -5.9736421051), (0, -6.2), (-1.66, -5.9736421051))
            Line((-1.66, -5.9736421051), (-1.66, -8.55))
            ThreePointArc((-1.66, -8.55), (0, -10.21), (1.66, -8.55))
        make_face()
        with Locations((0, -8.55)):
            Circle(F5_R, mode=Mode.SUBTRACT)
    extrude(amount=-F7_DEPTH)

    # F8#2
    f8_2_edges = [f1b.edges().sort_by_distance(p)[0] for p in [
        (-1.05, -5.750678, 1.403352),
        (-1.05, -4.090678, 4.278557),
        (-1.05, 4.090678, 4.278557),
        (-1.05, 5.750678, 1.403352),
        (-1.05, 1.66, -5.681909),
        (-1.05, -1.66, -5.681909),
    ]]
    fillet(f8_2_edges, radius=F8_2_R)

    # F9: chamfer of 2.2 x 0.5 on 1 edges, made by hand

    # F9_s1 → F9_t2 (revolve, cut)
    with BuildSketch(Plane.XZ):
        Polygon((0, 2.95), (-0.5, 0.75), (0, 0.75), align=None)
    revolve(axis=Axis((0, 0, 0), (1, 0, 0)), mode=Mode.SUBTRACT)


with BuildPart() as f1_1:
    add(f1.part)

    add(f1b.part)  # F10 merges F1b
    # F0 (on Front) → F10 (revolve)
    with BuildSketch(Plane.XZ):
        Polygon((-14.92, 0.75), (-14.92, 0), (0.62, 0), (0.62, 0.75), (0, 0.75), (-0.67, 0.75), (-2.35, 0.75), (-8.85, 0.75), align=None)
    revolve(axis=Axis((6.5496404592, 0, 0), (1, 0, 0)))


solid = f1_1.part
